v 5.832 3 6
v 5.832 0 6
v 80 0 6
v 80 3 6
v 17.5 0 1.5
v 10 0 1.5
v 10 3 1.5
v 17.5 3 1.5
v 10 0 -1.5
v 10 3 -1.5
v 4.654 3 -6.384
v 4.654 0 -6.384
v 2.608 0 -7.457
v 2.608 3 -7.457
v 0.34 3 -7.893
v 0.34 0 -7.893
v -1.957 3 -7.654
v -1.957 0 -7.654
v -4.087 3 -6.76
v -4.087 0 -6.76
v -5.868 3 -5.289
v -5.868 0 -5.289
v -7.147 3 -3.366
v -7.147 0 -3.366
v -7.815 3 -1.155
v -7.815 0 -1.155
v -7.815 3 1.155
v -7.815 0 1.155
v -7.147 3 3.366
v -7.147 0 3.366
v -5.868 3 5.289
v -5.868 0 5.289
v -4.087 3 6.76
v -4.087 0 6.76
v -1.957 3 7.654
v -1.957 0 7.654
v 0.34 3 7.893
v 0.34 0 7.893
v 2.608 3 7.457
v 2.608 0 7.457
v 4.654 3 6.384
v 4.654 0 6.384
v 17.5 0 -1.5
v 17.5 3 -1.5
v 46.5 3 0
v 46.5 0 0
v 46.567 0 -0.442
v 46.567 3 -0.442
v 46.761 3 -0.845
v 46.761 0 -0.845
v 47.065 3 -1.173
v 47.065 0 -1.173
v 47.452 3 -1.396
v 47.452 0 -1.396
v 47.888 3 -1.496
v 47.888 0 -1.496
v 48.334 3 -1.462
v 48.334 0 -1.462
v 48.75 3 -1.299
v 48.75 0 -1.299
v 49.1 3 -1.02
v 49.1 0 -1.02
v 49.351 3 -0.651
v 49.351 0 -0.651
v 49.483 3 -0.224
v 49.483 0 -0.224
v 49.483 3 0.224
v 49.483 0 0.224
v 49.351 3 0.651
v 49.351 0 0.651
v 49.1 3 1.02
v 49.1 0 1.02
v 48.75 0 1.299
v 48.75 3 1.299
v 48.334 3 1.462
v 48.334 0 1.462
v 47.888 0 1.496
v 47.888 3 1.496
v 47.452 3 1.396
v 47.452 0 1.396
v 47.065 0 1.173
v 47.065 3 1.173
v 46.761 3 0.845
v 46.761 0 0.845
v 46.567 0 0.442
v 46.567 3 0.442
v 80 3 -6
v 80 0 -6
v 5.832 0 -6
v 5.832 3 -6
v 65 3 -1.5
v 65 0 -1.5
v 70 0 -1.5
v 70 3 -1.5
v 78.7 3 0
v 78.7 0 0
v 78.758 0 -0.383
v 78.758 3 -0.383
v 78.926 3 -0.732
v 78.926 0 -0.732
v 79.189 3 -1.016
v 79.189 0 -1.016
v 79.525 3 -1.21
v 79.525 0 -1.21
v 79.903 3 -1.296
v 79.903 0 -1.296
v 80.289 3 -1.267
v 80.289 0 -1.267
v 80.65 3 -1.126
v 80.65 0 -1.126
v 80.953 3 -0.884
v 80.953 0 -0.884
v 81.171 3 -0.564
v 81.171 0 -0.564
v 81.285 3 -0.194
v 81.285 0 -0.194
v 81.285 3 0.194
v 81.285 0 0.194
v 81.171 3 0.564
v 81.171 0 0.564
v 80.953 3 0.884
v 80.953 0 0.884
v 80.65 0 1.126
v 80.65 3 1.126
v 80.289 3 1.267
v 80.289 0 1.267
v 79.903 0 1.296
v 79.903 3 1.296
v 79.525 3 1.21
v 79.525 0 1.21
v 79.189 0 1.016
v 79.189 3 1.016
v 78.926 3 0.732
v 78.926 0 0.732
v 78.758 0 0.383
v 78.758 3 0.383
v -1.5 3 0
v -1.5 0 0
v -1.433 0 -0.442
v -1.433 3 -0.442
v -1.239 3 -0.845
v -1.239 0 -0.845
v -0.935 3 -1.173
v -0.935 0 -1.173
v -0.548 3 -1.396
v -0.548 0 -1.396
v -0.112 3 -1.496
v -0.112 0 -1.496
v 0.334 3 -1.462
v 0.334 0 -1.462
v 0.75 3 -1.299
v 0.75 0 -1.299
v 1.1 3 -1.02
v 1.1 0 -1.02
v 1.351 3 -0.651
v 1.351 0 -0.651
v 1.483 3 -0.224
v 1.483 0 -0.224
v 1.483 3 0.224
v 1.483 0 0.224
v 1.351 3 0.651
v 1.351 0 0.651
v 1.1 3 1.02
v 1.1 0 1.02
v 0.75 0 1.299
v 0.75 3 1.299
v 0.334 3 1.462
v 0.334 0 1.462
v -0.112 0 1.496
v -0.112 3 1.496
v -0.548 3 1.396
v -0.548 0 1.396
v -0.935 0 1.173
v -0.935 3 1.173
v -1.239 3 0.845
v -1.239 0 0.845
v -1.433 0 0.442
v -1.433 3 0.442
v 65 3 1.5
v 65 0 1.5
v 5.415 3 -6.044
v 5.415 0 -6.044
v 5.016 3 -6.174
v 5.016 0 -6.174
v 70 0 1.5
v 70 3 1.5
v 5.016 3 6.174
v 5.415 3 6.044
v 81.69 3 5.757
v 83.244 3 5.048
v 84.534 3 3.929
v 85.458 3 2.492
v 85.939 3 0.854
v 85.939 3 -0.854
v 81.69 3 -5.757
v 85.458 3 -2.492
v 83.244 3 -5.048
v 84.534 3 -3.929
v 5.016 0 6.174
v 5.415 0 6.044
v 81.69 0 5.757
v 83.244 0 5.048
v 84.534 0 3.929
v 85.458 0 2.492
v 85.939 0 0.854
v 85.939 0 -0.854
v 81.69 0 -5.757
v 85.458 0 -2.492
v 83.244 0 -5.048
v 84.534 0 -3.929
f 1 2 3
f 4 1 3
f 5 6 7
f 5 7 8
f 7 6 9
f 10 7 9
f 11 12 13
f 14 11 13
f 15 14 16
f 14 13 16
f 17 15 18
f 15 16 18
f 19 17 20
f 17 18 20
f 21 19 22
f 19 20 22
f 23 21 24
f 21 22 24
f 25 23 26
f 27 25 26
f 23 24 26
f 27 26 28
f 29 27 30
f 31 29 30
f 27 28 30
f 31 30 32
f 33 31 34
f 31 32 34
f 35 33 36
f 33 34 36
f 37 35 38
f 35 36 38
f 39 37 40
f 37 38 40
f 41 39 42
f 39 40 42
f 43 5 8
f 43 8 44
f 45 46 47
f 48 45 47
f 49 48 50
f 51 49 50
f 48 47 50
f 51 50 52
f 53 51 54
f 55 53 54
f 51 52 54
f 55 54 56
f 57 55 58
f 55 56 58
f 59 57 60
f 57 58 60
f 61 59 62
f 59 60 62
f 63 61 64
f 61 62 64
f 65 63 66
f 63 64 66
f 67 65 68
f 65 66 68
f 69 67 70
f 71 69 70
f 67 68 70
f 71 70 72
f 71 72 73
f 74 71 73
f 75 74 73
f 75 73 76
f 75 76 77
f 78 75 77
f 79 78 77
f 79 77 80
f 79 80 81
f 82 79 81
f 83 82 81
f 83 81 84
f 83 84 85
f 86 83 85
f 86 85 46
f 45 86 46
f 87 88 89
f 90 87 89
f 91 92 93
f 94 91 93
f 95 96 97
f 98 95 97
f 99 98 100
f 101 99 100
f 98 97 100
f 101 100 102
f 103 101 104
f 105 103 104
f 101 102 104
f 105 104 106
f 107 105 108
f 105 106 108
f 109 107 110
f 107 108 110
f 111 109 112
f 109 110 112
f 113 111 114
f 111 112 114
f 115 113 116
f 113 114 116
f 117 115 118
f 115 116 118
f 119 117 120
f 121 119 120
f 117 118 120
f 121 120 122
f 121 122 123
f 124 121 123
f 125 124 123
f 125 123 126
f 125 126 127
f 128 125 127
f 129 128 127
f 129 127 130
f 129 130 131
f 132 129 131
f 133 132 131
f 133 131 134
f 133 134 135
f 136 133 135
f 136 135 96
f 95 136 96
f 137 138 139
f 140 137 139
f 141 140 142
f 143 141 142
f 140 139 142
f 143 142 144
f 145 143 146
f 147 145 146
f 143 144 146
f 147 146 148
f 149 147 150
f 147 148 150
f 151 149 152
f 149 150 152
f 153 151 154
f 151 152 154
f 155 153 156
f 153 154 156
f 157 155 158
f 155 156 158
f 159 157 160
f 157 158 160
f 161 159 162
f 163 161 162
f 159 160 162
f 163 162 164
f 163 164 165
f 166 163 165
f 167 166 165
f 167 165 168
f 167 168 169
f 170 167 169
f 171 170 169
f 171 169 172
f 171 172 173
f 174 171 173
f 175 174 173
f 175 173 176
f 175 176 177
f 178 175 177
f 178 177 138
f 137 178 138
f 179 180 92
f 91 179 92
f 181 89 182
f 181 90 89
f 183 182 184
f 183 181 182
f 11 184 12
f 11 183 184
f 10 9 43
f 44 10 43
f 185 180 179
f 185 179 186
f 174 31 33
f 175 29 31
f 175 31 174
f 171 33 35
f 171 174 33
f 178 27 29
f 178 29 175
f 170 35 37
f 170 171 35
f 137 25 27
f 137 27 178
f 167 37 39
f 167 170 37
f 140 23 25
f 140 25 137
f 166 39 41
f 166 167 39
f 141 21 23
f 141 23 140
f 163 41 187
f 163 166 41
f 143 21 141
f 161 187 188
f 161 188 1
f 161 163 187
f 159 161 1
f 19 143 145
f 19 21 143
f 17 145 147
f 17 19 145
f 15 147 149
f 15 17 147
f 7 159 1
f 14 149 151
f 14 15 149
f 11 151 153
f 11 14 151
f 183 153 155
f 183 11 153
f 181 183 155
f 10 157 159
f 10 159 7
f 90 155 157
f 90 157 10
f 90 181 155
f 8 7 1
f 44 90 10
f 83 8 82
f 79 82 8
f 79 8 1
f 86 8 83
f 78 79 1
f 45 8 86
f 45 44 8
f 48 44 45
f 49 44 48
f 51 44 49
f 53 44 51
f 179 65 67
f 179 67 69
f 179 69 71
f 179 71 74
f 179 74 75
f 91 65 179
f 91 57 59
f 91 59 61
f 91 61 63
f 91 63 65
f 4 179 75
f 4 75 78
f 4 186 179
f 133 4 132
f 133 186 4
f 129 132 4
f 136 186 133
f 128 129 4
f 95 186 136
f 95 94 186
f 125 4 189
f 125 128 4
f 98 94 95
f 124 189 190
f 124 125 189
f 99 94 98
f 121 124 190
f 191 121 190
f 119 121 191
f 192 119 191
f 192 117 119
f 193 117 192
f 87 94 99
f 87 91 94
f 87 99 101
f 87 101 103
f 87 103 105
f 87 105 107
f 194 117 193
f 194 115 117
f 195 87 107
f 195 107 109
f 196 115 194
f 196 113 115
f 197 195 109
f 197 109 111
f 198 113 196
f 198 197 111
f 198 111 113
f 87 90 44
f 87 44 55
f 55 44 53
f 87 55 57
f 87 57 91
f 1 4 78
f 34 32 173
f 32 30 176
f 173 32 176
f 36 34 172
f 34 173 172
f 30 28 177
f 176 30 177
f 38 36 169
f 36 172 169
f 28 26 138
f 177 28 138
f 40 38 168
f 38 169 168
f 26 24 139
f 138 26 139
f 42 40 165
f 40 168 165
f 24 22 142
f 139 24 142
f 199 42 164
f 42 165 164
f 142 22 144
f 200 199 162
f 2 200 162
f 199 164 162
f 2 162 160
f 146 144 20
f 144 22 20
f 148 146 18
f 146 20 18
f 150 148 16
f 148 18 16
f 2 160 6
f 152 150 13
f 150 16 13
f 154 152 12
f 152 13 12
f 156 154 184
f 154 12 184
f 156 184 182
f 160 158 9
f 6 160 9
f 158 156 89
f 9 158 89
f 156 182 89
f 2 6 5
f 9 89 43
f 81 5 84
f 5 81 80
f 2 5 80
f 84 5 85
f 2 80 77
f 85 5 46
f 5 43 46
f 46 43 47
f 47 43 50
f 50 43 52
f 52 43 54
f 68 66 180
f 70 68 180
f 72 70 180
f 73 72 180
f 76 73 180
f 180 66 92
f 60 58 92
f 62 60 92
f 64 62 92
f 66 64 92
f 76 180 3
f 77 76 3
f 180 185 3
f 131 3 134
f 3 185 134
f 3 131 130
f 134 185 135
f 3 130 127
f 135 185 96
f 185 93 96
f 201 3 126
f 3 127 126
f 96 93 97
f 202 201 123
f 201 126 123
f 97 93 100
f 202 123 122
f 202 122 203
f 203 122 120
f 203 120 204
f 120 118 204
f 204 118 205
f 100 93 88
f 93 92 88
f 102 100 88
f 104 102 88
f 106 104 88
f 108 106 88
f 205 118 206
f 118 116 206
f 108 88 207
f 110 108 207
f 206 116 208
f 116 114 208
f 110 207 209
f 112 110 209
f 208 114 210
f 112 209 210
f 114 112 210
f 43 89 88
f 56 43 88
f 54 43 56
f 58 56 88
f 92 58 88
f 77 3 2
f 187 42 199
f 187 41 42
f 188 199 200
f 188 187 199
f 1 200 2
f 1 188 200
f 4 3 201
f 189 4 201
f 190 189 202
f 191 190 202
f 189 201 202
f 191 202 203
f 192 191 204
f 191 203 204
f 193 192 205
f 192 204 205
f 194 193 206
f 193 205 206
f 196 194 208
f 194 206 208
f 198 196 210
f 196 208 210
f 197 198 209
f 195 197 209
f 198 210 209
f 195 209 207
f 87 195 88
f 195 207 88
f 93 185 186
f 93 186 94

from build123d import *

# Parameters (mm, degrees)
RESSALTO_EXTRUS_O1_DEPTH     = 3
ESBO_O2_W                    = 5
ESBO_O2_H                    = 3
ESBO_O2_W_2                  = 7.5
CORTE_EXTRUS_O1_DEPTH        = 87.414177078
FURO_DE_DI_METRO_3_0_3_1_D   = 3
FURO_DE_DI_METRO_2_6_2_6_1_D = 2.6
FILETE1_R                    = 2


with BuildPart() as part:
    # Esboço1 → Ressalto-extrusão1 (new body)
    with BuildSketch(Plane(origin=(0, 0, 0), x_dir=(1, 0, 0), z_dir=(0, 1, 0))):
        with BuildLine():
            Line((80, 6), (5.139066063, 6))
            ThreePointArc((5.139066063, 6), (-7.9, 0), (5.139066063, -6))
            Line((5.139066063, -6), (80, -6))
            ThreePointArc((80, -6), (86, 0), (80, 6))
        make_face()
    extrude(amount=RESSALTO_EXTRUS_O1_DEPTH)

    # Esboço2 → Corte-extrusão1 (cut, through all)
    with BuildSketch(Plane(origin=(0, 0, 0), x_dir=(1, 0, 0), z_dir=(0, 1, 0))):
        with Locations((67.5, 0)):
            Rectangle(ESBO_O2_W, ESBO_O2_H)
        with Locations((13.75, 0)):
            Rectangle(ESBO_O2_W_2, ESBO_O2_H)
    extrude(amount=CORTE_EXTRUS_O1_DEPTH, mode=Mode.SUBTRACT)

    # Furo de diâmetro Ø3.0 (3)1 (through all)
    with Locations(Plane(origin=(0, 3, 0), x_dir=(1, 0, 0), z_dir=(0, 1, 0))):
        with Locations((0, 0), (48, 0)):
            Hole(FURO_DE_DI_METRO_3_0_3_1_D / 2)

    # Furo de diâmetro Ø2.6 (2.6)1 (through all)
    with Locations(Plane(origin=(0, 3, 0), x_dir=(1, 0, 0), z_dir=(0, 1, 0))):
        with Locations((80, 0)):
            Hole(FURO_DE_DI_METRO_2_6_2_6_1_D / 2)

    # Filete1
    filete1_edges = [part.edges().sort_by_distance(p)[0] for p in [
        (5.139066063, 1.5, 6),
        (5.139066063, 1.5, -6),
    ]]
    fillet(filete1_edges, radius=FILETE1_R)


solid = part.part
